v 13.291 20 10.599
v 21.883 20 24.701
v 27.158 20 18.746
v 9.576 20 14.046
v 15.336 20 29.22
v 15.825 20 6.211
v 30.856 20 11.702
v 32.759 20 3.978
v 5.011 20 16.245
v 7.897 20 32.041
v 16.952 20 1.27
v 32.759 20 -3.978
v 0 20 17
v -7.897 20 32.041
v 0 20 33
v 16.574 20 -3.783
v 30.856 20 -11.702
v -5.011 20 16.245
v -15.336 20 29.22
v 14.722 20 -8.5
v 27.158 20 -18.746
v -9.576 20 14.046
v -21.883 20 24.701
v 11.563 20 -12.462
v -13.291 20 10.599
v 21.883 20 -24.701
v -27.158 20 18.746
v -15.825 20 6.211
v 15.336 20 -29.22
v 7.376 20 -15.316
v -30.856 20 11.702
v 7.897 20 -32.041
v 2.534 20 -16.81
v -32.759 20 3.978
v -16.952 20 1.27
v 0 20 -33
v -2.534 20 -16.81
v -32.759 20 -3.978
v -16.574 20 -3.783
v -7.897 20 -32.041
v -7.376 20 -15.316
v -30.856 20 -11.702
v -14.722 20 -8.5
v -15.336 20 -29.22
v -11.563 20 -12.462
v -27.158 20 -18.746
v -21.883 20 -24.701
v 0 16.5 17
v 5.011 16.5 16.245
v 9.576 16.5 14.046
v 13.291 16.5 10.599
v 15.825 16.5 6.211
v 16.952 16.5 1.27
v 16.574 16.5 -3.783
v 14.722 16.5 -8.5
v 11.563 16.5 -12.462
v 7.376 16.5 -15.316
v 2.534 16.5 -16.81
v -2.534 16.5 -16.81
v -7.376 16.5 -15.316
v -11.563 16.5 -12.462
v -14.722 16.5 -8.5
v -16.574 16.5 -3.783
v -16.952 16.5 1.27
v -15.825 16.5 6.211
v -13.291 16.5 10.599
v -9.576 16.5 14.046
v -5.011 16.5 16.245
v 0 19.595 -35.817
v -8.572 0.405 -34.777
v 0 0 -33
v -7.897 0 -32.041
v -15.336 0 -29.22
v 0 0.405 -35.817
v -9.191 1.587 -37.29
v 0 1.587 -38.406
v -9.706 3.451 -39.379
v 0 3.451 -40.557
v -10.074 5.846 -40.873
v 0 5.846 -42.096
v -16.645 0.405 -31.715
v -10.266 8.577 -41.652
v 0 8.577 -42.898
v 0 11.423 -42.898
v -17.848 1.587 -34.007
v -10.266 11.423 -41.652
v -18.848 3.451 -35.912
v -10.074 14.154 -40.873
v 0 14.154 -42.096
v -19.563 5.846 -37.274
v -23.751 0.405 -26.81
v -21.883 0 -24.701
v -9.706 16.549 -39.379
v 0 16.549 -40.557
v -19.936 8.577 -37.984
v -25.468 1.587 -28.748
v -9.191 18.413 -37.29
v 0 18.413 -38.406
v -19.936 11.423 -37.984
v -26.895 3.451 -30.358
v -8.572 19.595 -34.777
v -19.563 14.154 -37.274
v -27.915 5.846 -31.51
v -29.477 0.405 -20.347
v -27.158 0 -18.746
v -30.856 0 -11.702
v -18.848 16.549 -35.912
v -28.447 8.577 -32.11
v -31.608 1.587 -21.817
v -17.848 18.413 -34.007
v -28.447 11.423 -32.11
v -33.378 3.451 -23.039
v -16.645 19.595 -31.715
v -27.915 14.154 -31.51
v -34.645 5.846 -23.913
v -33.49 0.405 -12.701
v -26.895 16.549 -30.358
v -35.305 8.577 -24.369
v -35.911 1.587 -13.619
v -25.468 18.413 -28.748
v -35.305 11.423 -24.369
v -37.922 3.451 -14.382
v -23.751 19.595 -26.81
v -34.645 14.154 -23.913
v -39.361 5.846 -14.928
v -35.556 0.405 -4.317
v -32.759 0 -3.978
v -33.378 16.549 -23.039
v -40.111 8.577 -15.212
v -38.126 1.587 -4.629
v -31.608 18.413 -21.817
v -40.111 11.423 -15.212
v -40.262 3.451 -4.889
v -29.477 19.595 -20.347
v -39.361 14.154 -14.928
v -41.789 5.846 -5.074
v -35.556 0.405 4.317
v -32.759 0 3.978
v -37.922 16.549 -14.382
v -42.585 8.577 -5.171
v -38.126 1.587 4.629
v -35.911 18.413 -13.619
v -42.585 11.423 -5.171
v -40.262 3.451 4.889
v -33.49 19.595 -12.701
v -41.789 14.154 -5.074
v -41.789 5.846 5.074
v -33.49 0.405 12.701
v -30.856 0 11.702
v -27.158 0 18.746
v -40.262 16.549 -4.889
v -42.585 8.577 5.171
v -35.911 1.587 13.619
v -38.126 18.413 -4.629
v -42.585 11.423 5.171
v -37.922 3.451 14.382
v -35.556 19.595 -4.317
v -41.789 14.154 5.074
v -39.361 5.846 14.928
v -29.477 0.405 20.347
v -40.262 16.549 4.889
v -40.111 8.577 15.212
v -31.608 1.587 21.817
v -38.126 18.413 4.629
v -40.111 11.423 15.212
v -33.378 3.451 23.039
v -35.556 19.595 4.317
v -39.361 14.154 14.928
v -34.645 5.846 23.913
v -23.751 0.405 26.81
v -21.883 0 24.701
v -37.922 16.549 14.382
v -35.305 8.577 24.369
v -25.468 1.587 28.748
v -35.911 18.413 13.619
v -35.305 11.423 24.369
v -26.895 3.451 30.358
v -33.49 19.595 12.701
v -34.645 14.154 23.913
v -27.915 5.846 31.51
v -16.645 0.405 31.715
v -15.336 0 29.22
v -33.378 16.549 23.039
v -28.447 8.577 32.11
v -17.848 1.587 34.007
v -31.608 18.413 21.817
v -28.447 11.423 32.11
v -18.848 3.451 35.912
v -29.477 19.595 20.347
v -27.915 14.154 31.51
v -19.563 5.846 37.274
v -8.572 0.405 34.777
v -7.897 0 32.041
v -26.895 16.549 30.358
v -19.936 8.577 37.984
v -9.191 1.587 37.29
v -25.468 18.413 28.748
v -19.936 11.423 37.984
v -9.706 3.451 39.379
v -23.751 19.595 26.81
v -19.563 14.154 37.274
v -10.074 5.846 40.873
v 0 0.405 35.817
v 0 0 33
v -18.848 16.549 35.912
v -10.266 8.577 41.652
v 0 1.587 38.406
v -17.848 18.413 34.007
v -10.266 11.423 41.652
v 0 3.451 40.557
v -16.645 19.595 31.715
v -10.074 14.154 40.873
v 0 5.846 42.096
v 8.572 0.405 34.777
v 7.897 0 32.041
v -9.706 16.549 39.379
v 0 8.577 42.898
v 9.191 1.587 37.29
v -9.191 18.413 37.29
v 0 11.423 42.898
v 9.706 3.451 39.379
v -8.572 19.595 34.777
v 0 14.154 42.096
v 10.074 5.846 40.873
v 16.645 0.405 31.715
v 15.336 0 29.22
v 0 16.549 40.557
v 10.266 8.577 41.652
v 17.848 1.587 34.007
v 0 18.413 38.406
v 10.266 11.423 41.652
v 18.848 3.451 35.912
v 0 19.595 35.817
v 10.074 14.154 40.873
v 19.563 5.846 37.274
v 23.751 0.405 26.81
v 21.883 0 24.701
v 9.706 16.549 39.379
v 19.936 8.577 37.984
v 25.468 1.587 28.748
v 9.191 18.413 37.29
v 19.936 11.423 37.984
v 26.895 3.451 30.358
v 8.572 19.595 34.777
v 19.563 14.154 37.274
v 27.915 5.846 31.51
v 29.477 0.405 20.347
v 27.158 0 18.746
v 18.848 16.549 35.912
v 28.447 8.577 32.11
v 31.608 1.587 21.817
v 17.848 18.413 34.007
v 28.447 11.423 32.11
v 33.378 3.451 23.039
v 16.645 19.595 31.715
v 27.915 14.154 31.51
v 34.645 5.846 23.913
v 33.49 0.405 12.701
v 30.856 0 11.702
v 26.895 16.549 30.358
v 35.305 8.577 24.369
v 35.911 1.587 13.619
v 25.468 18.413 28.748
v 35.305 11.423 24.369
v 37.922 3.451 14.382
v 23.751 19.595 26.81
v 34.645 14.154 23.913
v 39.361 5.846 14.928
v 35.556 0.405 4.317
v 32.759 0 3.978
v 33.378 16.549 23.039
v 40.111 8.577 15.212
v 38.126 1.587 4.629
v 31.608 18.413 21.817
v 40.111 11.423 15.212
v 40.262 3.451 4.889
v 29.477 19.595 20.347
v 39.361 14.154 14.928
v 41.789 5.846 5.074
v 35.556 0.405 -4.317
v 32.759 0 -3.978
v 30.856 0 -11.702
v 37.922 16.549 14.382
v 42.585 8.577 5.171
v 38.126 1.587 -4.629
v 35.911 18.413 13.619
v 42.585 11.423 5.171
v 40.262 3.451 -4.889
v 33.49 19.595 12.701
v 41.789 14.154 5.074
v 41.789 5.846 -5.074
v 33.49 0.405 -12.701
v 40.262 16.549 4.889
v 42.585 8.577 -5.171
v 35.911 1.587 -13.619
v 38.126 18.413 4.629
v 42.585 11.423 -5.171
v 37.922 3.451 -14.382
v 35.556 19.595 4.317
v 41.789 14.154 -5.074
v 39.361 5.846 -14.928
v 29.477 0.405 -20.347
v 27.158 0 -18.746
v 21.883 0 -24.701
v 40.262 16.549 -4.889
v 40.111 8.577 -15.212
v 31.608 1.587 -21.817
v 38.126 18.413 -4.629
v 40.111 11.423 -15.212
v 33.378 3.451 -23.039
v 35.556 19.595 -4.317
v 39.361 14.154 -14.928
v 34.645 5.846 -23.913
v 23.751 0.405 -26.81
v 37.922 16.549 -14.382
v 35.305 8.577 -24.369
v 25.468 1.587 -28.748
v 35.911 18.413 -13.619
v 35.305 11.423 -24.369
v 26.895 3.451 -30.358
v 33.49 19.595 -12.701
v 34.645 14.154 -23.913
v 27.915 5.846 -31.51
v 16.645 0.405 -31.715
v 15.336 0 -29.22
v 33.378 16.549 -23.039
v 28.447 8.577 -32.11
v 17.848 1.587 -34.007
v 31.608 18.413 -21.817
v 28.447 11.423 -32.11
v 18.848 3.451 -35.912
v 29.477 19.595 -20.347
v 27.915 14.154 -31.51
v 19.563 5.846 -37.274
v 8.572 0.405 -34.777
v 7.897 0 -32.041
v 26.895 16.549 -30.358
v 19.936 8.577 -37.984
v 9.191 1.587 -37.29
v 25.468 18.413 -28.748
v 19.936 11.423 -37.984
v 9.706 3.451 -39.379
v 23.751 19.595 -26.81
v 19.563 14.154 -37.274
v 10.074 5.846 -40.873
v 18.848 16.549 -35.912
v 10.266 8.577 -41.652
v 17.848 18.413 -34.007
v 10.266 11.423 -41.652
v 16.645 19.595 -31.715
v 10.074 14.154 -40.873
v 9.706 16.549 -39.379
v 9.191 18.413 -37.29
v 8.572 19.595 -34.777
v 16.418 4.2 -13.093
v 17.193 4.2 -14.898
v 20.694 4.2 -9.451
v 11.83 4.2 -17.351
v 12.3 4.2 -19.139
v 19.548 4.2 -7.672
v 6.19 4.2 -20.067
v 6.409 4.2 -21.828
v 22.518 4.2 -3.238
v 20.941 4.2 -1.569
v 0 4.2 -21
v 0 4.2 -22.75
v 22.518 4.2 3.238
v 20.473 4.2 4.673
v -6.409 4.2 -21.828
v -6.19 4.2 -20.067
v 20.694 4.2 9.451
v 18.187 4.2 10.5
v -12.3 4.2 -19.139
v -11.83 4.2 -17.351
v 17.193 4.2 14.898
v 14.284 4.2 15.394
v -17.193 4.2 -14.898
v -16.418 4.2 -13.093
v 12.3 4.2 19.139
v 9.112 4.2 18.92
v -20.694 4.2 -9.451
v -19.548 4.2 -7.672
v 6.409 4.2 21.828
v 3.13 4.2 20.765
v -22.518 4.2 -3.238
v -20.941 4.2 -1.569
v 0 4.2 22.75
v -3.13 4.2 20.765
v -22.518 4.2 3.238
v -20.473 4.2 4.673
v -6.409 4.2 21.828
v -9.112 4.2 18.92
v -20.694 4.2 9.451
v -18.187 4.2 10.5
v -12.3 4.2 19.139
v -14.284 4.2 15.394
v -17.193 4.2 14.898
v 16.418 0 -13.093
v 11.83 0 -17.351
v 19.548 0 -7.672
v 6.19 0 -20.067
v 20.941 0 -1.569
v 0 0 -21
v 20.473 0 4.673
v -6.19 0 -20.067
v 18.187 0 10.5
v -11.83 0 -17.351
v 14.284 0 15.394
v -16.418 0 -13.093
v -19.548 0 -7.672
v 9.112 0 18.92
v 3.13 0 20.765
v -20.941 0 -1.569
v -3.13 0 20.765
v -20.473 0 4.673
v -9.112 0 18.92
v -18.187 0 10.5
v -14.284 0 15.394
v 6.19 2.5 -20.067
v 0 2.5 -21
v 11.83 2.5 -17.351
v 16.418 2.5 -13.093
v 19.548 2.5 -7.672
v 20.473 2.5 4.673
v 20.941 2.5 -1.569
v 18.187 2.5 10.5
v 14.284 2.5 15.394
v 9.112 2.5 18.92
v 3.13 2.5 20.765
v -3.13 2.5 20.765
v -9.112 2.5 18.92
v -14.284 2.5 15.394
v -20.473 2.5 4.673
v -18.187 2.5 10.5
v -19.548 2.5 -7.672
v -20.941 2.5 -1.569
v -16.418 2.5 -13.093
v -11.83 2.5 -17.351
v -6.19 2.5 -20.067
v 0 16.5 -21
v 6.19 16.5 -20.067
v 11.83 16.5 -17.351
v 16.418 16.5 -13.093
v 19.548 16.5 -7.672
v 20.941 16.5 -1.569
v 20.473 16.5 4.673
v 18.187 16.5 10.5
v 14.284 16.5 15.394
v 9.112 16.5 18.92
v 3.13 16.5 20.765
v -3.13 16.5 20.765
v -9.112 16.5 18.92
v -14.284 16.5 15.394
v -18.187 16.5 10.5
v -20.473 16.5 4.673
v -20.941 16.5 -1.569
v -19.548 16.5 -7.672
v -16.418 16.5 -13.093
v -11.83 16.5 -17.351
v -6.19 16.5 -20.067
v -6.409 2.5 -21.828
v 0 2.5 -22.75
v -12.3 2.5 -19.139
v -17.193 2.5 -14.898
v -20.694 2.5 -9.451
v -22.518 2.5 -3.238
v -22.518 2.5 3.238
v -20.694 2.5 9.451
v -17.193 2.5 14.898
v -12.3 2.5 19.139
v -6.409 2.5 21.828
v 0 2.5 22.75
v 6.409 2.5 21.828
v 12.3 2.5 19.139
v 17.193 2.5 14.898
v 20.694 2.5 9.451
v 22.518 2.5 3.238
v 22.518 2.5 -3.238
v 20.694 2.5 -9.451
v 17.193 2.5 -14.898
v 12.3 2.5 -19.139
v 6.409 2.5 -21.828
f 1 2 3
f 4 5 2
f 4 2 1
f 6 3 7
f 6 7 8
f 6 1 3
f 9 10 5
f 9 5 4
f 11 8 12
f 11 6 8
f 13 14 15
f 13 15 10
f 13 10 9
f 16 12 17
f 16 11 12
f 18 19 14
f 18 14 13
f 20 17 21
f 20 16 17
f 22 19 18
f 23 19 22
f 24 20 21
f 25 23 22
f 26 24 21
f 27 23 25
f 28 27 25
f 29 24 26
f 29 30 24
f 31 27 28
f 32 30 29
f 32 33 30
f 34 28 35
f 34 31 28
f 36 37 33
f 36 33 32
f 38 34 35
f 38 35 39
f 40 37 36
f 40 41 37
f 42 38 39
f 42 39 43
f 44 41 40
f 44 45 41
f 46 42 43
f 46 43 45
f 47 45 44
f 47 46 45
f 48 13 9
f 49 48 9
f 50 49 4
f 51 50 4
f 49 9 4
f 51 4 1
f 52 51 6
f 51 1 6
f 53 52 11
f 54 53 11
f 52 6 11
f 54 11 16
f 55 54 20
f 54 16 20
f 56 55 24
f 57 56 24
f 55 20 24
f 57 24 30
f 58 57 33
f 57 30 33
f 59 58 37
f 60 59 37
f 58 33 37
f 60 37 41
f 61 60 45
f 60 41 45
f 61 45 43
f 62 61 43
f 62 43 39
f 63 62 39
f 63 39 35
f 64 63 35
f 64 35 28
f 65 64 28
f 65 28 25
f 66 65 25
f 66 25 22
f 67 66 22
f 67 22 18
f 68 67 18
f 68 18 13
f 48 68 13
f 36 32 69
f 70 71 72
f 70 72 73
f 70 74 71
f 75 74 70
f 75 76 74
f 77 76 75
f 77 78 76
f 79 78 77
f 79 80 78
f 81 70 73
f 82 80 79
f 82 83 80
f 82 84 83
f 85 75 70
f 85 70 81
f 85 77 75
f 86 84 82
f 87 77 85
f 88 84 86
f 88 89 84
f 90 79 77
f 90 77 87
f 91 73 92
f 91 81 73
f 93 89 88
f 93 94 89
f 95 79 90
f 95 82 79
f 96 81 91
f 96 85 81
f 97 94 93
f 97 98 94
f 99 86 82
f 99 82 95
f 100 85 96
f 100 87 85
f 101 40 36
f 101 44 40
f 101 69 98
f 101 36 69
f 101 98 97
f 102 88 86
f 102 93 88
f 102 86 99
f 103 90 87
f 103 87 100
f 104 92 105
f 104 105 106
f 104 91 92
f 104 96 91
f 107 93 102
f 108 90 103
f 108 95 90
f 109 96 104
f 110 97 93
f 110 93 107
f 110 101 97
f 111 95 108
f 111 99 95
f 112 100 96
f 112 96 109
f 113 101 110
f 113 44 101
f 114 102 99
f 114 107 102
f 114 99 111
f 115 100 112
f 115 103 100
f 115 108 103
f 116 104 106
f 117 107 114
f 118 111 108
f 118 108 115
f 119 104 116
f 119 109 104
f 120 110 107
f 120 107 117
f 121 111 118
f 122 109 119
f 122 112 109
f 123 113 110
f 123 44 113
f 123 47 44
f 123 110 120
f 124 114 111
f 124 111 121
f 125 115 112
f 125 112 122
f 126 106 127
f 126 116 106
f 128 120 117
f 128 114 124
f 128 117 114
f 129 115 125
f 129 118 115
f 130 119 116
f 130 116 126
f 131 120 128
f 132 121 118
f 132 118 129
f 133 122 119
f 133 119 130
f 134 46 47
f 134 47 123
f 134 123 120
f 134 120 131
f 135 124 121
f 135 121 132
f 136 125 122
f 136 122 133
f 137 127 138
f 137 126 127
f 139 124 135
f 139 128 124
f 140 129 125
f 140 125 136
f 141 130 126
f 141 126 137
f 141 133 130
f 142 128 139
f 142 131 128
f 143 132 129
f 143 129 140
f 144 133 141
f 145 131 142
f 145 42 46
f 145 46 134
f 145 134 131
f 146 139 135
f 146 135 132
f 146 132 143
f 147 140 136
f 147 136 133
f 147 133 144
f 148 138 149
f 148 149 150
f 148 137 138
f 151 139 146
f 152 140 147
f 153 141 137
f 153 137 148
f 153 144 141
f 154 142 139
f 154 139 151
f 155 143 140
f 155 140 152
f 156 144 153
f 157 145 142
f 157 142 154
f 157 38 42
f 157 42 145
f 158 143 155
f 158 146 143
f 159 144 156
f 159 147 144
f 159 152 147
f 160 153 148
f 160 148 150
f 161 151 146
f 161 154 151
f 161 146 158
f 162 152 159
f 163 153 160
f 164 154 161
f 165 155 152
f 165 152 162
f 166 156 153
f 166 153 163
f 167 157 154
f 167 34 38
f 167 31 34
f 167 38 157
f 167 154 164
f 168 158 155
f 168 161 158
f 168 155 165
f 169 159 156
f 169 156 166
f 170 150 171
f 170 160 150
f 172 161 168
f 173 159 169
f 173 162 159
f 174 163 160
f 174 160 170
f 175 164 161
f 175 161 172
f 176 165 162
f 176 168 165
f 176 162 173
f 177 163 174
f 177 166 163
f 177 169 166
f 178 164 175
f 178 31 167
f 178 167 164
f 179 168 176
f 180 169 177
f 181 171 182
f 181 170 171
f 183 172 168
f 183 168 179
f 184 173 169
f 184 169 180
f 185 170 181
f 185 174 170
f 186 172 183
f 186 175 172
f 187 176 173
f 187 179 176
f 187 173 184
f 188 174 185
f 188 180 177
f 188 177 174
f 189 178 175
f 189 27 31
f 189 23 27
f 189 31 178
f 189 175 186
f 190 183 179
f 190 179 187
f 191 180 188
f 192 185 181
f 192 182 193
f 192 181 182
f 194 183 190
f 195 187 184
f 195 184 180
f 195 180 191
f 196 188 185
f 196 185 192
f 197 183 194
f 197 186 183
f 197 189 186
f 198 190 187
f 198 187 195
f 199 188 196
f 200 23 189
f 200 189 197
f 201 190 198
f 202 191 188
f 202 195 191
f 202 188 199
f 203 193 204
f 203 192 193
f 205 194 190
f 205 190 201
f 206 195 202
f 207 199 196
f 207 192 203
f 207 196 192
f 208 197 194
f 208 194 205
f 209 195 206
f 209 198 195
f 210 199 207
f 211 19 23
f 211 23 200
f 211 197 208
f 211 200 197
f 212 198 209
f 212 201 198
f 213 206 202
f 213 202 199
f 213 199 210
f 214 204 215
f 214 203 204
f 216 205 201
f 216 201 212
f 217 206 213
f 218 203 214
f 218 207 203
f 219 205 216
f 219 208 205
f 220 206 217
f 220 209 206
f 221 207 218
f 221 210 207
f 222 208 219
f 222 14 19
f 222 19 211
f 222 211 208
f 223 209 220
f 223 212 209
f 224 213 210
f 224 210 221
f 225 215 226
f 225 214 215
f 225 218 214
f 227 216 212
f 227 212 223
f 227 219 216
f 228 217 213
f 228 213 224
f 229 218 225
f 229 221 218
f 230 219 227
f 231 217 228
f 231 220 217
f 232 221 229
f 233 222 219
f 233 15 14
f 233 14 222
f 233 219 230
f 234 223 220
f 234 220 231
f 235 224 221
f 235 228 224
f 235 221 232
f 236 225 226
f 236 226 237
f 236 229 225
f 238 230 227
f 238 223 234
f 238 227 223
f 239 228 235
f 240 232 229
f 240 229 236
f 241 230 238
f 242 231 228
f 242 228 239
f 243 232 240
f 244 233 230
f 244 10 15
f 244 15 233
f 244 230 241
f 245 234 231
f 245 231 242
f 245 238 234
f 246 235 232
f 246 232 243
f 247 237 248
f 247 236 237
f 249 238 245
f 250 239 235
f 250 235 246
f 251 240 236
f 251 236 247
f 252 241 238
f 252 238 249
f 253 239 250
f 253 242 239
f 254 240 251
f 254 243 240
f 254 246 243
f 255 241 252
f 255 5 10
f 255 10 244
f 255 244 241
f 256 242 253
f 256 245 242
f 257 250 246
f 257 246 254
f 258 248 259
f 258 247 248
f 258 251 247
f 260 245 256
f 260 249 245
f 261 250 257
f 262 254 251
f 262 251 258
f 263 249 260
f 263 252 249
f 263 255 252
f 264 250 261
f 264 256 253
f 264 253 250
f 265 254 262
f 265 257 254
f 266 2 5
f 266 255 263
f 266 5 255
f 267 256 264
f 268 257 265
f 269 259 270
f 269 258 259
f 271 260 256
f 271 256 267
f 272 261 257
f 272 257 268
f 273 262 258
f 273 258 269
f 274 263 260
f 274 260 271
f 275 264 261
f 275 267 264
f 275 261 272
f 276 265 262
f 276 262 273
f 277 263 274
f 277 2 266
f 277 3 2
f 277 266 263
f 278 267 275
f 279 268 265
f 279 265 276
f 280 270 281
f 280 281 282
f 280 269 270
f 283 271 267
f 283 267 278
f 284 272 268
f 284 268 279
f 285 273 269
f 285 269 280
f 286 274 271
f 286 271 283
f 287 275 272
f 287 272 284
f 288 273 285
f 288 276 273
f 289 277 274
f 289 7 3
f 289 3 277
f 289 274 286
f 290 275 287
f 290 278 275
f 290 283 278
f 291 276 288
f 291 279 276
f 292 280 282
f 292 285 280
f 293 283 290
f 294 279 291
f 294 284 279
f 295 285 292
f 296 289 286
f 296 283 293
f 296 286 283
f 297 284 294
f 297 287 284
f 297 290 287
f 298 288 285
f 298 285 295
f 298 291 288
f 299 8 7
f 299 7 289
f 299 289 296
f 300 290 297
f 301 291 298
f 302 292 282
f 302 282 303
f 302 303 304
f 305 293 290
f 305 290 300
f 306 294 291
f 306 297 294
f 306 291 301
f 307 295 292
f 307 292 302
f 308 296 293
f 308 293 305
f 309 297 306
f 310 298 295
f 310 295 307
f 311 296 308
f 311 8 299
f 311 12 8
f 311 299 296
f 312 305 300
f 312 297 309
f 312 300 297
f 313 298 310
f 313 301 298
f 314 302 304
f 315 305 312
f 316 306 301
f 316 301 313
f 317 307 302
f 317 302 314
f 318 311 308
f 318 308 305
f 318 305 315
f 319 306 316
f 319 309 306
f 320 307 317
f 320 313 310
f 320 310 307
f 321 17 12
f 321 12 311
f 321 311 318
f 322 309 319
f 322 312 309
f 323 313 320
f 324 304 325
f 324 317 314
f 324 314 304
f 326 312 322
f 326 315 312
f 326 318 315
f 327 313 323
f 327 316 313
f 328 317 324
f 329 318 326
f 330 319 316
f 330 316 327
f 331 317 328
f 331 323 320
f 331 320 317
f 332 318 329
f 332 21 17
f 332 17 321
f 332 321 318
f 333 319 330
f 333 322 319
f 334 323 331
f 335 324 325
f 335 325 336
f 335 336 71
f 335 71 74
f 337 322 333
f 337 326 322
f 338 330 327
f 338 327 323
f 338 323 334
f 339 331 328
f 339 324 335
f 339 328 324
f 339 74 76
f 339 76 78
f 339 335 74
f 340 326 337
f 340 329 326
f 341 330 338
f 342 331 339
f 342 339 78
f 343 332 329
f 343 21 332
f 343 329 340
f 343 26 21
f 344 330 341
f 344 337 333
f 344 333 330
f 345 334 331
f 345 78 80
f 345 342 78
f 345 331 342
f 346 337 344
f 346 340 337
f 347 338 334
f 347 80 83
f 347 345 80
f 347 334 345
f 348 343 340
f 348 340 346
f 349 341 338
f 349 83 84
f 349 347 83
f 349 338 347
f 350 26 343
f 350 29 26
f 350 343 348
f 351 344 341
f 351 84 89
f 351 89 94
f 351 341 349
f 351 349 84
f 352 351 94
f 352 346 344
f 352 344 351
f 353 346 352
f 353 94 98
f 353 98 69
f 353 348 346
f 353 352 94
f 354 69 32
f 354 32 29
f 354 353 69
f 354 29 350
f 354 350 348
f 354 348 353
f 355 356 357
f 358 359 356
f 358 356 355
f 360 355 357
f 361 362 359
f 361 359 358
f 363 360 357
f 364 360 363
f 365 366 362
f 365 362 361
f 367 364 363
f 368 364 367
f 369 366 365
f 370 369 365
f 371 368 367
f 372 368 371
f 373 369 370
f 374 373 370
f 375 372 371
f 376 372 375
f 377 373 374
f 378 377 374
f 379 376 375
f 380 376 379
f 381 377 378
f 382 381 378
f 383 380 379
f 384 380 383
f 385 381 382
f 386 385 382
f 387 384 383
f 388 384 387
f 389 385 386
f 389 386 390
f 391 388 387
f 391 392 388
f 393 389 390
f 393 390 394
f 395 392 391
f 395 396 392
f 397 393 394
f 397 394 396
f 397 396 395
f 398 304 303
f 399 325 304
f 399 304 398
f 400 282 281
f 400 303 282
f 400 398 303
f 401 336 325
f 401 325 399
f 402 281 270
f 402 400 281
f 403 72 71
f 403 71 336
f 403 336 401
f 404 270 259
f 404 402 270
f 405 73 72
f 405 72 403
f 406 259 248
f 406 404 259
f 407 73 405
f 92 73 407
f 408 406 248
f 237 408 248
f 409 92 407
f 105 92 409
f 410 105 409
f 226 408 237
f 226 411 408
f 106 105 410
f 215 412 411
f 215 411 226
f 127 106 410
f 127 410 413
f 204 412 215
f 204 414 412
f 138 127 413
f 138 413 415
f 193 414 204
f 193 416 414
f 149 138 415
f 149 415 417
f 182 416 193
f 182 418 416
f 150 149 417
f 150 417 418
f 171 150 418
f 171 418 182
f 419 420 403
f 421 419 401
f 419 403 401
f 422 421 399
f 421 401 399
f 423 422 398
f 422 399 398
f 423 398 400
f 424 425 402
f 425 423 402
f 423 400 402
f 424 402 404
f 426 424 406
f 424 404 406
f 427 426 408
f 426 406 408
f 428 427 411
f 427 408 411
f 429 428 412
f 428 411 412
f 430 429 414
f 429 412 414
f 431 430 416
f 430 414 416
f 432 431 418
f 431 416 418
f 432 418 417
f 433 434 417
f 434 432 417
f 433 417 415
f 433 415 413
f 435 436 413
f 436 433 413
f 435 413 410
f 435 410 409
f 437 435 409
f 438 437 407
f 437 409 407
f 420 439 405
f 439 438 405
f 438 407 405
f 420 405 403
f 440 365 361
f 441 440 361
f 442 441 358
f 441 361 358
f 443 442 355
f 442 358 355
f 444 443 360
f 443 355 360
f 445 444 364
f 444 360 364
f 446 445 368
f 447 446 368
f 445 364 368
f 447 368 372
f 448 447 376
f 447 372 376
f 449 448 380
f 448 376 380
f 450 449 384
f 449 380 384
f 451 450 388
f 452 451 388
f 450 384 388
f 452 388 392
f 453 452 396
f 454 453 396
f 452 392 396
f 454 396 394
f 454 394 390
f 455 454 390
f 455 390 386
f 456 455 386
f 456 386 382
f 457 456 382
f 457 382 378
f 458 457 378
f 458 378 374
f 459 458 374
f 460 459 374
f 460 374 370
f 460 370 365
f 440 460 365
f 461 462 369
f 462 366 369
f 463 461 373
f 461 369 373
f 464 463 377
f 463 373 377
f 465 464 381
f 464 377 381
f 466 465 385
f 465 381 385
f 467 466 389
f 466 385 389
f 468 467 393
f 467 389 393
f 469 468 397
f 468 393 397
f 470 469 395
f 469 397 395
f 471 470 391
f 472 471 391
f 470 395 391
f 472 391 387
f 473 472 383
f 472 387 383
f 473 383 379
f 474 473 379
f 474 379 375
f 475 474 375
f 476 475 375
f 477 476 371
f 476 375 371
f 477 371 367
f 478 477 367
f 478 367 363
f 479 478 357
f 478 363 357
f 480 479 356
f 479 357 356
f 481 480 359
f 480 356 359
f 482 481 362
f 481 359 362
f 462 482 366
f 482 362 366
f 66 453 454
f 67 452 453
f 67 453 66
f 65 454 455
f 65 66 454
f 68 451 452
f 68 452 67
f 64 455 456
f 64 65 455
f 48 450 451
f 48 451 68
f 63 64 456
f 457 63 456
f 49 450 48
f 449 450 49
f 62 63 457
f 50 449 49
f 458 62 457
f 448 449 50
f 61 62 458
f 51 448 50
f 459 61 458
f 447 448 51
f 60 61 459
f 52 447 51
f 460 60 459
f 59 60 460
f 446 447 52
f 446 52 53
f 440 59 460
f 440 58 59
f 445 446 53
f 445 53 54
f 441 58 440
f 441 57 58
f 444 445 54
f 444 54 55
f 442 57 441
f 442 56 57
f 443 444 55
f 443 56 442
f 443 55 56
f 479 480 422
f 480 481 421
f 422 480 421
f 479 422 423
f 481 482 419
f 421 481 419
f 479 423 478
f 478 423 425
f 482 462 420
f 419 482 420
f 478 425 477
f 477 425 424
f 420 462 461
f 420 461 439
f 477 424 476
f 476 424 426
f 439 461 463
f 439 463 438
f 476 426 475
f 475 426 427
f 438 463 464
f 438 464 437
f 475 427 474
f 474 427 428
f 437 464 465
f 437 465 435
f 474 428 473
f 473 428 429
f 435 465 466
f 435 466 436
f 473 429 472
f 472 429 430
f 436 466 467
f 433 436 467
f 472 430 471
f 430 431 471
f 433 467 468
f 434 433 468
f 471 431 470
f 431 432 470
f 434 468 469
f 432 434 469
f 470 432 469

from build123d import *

# Parameters (mm, degrees)
SKETCH_5_R          = 21
CUT_EXTRUDE_1_DEPTH = 16.5
SKETCH_6_W          = 1.75
SKETCH_6_H          = 1.7
SKETCH_7_R          = 17
CUT_EXTRUDE_2_DEPTH = 16


with BuildPart() as part:
    # 草图1 → 旋转1 (revolve)
    with BuildSketch(Plane.XY, mode=Mode.PRIVATE) as revolve_1_sk:
        with BuildLine():
            Line((10, 0), (33, 0))
            ThreePointArc((33, 0), (43, 10), (33, 20))
            Line((33, 20), (10, 20))
            Line((10, 20), (10, 0))
        make_face()
    revolve(revolve_1_sk.sketch.rotate(Axis((0, 0, 0), (0, 1, 0)), 90), axis=Axis((0, 0, 0), (0, 1, 0)))

    # 草图5 → 切除-拉伸1 (cut)
    with BuildSketch(Plane.XZ):
        with Locations(Location((0, 0, 0), (0, 0, 270))):
            Circle(SKETCH_5_R)
    extrude(amount=-CUT_EXTRUDE_1_DEPTH, mode=Mode.SUBTRACT)

    # 草图6 → 切除-旋转1 (revolve, cut)
    with BuildSketch(Plane(origin=(0, 0, 0), x_dir=(0, 0, -1), z_dir=(1, 0, 0))):
        with Locations((21.875, 3.35)):
            Rectangle(SKETCH_6_W, SKETCH_6_H)
    revolve(axis=Axis((0, 0, 0), (0, 1, 0)), mode=Mode.SUBTRACT)

    # 草图7 → 切除-拉伸2 (cut)
    with BuildSketch(Plane(origin=(0, 20, 0), x_dir=(1, 0, 0), z_dir=(0, 1, 0))):
        with Locations(Location((0, 0, 0), (0, 0, 270))):
            Circle(SKETCH_7_R)
    extrude(amount=-CUT_EXTRUDE_2_DEPTH, mode=Mode.SUBTRACT)


solid = part.part
